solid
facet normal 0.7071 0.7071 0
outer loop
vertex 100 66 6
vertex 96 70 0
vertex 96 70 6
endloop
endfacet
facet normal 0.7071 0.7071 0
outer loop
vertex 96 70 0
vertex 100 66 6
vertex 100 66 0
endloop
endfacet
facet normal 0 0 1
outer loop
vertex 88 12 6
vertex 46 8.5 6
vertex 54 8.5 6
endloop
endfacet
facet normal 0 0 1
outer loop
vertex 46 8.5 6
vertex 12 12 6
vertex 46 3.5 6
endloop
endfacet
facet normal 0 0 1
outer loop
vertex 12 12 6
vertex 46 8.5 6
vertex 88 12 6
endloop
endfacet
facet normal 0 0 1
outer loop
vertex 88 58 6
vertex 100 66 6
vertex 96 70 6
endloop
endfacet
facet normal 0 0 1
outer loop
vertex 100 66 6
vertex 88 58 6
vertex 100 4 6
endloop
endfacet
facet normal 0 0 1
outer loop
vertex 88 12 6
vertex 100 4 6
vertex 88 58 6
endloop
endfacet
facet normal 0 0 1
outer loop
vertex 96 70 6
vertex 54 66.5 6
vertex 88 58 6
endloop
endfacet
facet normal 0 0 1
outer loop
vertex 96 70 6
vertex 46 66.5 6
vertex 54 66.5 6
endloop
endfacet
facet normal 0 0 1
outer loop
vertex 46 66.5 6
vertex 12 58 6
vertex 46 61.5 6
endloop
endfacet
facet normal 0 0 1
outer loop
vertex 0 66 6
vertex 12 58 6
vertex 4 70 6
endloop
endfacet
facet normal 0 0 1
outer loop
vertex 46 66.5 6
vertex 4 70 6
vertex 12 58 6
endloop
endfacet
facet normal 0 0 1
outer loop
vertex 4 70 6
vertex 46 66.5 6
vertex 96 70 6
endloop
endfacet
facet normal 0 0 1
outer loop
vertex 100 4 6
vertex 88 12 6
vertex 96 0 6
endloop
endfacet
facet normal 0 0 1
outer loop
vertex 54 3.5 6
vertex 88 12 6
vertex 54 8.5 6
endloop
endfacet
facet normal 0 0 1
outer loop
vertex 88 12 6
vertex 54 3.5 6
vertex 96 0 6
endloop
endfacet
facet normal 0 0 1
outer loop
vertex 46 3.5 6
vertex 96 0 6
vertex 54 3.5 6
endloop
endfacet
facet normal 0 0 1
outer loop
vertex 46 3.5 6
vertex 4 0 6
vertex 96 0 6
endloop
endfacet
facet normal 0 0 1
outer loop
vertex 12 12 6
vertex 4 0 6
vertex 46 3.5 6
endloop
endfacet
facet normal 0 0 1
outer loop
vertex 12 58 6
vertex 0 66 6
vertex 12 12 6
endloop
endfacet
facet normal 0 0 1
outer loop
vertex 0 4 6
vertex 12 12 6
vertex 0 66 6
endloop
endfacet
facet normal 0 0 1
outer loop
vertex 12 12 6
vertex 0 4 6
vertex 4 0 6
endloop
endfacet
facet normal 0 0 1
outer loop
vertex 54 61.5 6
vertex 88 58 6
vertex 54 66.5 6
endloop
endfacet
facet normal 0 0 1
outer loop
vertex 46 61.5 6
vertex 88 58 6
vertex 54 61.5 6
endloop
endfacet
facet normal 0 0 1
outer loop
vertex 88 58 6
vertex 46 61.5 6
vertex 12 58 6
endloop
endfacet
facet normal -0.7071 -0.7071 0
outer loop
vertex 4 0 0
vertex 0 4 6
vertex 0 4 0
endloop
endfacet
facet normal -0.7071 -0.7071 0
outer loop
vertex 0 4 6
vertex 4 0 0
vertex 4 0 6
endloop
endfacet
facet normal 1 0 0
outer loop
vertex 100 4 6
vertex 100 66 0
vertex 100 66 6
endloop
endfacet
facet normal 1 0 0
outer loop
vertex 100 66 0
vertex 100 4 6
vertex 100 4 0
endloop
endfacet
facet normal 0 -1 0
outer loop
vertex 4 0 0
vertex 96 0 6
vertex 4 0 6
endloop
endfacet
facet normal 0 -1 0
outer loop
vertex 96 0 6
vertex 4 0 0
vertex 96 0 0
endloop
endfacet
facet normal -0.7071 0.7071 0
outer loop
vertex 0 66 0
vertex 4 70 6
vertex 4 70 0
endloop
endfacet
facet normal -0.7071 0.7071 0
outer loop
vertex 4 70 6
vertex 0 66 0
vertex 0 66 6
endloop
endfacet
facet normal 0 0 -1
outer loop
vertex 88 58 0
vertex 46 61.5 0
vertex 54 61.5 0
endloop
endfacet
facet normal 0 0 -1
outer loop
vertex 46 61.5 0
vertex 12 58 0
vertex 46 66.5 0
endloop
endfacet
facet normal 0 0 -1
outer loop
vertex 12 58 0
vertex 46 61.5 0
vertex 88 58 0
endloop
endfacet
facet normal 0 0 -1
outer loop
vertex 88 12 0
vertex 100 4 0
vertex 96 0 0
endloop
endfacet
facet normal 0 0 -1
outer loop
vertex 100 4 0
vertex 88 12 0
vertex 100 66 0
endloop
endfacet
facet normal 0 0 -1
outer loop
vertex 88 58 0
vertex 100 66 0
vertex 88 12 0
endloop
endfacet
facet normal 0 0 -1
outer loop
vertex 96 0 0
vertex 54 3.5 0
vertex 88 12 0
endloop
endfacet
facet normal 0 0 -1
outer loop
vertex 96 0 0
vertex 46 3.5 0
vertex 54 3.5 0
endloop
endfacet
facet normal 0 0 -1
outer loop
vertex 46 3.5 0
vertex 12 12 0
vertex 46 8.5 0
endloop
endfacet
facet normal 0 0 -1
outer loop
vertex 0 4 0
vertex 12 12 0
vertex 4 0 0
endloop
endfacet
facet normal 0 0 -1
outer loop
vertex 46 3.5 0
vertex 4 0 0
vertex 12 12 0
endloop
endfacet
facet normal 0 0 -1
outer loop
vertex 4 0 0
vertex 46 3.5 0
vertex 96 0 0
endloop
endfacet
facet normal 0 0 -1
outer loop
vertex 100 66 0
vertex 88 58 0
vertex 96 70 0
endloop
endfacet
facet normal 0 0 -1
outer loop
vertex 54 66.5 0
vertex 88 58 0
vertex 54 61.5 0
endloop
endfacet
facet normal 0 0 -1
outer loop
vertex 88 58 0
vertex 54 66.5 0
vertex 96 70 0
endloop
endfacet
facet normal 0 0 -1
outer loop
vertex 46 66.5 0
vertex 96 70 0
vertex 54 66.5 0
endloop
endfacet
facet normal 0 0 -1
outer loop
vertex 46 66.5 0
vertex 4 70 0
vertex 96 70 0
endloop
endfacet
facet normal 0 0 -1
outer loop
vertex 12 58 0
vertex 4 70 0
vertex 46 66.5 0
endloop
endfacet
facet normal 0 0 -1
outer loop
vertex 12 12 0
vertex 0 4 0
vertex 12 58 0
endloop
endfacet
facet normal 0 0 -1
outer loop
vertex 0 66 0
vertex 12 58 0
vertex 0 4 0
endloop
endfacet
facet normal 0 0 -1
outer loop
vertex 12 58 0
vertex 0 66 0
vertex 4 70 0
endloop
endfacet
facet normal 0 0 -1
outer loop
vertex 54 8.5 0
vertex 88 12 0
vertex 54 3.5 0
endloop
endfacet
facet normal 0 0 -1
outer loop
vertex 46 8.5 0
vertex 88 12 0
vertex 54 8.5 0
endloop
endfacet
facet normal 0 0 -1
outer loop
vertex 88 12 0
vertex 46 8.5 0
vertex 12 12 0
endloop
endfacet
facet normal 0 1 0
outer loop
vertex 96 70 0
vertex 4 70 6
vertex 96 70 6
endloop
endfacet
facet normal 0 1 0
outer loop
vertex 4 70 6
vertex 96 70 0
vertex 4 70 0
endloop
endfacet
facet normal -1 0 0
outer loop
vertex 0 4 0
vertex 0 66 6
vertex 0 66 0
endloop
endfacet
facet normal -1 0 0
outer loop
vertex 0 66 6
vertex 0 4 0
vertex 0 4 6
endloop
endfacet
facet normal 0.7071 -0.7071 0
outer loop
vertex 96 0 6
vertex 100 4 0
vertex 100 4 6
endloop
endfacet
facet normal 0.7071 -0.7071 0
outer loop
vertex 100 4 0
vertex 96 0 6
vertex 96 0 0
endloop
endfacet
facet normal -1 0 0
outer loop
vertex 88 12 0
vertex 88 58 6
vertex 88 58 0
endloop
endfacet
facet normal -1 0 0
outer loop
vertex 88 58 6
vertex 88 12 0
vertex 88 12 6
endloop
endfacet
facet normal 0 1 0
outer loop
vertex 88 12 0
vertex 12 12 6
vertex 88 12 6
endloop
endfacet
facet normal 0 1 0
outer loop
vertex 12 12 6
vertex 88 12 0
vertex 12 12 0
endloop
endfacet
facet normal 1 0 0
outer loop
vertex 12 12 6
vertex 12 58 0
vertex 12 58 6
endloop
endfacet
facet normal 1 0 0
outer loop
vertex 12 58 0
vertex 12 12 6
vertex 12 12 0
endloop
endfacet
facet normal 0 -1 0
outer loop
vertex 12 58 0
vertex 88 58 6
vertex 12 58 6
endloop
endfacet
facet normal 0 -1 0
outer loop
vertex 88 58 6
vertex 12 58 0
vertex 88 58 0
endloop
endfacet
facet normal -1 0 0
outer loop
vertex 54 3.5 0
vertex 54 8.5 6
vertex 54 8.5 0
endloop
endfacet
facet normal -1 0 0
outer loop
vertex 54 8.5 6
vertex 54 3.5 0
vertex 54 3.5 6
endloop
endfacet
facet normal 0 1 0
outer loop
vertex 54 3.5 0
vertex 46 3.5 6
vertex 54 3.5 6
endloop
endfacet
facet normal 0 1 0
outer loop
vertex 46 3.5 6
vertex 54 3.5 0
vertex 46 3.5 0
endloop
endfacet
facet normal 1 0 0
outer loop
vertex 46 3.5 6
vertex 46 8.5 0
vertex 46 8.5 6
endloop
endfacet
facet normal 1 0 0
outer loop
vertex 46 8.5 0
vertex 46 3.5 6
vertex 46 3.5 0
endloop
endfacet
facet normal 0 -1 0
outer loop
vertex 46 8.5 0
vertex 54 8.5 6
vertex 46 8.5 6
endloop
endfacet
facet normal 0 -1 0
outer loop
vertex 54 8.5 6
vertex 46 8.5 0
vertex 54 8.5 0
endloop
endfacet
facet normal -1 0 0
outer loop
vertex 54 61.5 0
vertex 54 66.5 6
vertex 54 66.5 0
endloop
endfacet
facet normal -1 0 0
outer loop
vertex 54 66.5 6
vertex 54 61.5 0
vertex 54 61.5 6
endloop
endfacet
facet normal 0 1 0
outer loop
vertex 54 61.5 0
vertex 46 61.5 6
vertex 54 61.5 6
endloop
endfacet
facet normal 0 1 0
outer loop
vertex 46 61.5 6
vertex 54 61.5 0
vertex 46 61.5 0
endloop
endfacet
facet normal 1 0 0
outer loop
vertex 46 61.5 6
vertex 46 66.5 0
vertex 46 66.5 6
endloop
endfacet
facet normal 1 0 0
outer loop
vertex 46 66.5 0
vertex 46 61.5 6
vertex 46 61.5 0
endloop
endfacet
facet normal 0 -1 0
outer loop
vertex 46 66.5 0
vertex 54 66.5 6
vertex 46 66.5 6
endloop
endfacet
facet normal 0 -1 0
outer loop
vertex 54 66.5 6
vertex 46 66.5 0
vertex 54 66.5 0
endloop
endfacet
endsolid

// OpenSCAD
$fn = 32;

// ----------------------------------------------------------------------
// Frame plate: 100 x 70 frame, 12 mm rails
// ----------------------------------------------------------------------

// --- parameters (mm) ---
plate_l = 100;            // plate length, X
plate_w = 70;             // plate width, Y
plate_t = 6;              // plate thickness, Z (extrusion height)
corner_c = 4;             // corner chamfer
frame_bar = 12;           // frame rail width
slot_l = 8;               // adjustment slot length
slot_w = 5;               // adjustment slot width

win_l = plate_l - 2 * frame_bar;  // window length
win_w = plate_w - 2 * frame_bar;  // window width

profile = [[4, 0], [96, 0], [100, 4], [100, 66], [96, 70], [4, 70], [0, 66], [0, 4]];  // primary outline, 8 points, counter clockwise
void_1 = [[12, 12], [88, 12], [88, 58], [12, 58]];  // the window, 4 points
void_2 = [[46, 3.5], [54, 3.5], [54, 8.5], [46, 8.5]];  // adjustment slot, 4 points
void_3 = [[46, 61.5], [54, 61.5], [54, 66.5], [46, 66.5]];  // adjustment slot, 4 points

// --- the one profile operation ---
difference() {
  linear_extrude(height = plate_t) polygon(points = profile);
  translate([0, 0, -1])
    linear_extrude(height = plate_t + 2) polygon(points = void_1);
  translate([0, 0, -1])
    linear_extrude(height = plate_t + 2) polygon(points = void_2);
  translate([0, 0, -1])
    linear_extrude(height = plate_t + 2) polygon(points = void_3);
}
